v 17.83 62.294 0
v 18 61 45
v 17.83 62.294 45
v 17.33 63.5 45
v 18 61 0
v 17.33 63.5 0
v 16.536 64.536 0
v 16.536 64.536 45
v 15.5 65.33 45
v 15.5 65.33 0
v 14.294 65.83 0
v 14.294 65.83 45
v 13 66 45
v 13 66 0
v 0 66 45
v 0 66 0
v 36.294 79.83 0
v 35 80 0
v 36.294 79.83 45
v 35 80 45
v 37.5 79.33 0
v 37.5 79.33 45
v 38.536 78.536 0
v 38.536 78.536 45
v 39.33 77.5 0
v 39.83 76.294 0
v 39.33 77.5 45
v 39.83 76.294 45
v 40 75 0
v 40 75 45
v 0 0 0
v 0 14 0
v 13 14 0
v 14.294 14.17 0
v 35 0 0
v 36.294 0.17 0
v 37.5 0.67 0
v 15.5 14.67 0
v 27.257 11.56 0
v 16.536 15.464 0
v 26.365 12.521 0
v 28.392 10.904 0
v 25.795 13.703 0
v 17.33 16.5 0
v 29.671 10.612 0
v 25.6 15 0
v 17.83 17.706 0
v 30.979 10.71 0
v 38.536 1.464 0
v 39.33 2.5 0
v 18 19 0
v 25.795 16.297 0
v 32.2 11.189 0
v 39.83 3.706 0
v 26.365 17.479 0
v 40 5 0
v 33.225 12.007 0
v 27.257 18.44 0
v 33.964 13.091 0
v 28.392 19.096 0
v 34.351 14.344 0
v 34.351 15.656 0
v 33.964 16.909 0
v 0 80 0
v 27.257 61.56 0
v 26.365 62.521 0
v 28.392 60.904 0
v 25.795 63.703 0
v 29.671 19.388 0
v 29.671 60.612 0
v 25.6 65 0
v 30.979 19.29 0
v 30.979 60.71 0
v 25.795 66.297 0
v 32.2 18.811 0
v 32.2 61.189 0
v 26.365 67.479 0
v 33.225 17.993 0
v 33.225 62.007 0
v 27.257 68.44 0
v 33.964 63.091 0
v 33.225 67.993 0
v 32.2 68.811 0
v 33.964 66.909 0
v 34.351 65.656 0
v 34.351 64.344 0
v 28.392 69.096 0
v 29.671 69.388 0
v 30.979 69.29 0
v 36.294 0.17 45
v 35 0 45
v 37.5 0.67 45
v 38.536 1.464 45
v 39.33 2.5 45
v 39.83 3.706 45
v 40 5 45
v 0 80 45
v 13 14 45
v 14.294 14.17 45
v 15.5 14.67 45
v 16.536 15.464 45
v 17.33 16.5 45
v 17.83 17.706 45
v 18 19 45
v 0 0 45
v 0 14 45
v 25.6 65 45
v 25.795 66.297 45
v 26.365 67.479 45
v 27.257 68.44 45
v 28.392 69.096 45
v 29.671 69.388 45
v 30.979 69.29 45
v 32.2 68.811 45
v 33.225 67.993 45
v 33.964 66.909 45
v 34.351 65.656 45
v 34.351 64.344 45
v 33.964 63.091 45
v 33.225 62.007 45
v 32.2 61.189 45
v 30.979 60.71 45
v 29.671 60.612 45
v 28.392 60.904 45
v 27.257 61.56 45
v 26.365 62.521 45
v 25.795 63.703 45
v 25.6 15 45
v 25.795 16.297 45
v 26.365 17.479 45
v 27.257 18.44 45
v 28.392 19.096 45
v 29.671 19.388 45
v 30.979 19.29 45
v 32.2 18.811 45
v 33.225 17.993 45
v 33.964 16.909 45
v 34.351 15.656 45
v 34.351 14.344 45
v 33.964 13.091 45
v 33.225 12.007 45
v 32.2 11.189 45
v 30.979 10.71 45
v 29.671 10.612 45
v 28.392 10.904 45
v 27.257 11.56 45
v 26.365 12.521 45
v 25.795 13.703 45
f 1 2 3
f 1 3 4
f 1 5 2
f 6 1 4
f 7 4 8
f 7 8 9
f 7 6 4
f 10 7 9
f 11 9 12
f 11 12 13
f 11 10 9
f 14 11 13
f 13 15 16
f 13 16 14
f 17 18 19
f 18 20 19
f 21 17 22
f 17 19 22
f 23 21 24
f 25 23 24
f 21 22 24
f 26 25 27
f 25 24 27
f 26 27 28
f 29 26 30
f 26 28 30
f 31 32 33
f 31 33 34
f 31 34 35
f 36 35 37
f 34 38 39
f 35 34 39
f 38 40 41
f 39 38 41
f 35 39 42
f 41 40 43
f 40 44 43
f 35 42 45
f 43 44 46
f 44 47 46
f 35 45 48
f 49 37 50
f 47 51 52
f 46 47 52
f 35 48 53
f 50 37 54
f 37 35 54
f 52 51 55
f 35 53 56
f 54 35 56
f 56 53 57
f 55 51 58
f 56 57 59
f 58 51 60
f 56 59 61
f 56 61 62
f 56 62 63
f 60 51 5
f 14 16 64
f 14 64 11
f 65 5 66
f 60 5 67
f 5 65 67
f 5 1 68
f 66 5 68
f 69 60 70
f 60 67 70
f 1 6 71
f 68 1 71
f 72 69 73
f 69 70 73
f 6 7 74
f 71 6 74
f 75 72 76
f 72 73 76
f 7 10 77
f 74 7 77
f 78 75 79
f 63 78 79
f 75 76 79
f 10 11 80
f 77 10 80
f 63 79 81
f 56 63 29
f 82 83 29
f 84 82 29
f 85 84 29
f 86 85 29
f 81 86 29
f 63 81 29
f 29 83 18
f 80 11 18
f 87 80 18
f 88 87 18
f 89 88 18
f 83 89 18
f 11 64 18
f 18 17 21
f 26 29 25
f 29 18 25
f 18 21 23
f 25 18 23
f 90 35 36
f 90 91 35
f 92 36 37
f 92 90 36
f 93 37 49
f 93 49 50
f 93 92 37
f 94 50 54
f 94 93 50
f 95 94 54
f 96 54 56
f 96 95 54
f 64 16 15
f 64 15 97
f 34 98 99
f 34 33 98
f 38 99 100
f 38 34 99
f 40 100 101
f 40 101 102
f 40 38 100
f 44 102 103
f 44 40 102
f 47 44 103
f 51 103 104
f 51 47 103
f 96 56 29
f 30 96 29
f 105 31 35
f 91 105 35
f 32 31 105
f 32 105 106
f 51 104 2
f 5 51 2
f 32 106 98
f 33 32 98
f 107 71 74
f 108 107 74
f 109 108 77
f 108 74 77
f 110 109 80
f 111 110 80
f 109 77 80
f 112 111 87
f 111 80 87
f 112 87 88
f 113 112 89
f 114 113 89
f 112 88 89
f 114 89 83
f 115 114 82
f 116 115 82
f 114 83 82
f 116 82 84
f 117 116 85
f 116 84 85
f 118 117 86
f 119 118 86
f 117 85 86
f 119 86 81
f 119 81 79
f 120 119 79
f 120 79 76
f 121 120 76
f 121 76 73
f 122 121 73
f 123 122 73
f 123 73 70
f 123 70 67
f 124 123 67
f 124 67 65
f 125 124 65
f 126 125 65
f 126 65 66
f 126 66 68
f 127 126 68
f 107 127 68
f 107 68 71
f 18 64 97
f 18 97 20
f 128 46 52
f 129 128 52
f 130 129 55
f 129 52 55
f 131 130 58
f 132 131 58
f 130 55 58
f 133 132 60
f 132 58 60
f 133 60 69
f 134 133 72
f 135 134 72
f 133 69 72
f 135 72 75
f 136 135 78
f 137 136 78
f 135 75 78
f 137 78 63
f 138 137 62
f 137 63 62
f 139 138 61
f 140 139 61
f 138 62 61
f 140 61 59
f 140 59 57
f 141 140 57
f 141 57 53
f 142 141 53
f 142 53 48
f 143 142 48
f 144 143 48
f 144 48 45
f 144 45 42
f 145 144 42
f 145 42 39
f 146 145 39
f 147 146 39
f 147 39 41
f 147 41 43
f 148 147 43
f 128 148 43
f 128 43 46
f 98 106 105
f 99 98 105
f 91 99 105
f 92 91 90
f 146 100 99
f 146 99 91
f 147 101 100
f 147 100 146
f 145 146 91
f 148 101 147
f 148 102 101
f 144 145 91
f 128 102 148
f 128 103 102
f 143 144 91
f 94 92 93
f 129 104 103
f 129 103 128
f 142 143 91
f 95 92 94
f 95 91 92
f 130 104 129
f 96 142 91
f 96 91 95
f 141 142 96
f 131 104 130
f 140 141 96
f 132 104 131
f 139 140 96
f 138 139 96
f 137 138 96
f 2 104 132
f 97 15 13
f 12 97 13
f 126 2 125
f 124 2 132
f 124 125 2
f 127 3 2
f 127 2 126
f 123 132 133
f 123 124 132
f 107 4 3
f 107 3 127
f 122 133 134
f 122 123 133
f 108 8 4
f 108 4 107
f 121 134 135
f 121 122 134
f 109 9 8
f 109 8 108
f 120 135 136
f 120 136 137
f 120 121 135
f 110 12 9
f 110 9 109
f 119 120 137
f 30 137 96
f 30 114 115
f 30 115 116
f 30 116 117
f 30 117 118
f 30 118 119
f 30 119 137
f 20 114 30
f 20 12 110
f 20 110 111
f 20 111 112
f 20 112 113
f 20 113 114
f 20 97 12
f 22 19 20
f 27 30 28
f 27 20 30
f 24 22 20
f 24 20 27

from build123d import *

# Parameters (mm, degrees)
F0_W     = 40
F0_H     = 80
F1_DEPTH = 45
F3_D     = 8.8
F4_W     = 18
F4_H     = 52
F5_DEPTH = 45
F6_R     = 5


with BuildPart() as f1:
    # F0 (on Top) → F1 (new body)
    with BuildSketch(Plane.XY):
        with Locations((20, 40)):
            Rectangle(F0_W, F0_H)
    extrude(amount=F1_DEPTH)

    # F3 (through all)
    with Locations(Plane.XY.offset(45)):
        with Locations((30, 65), (30, 15)):
            Hole(F3_D / 2)

    # F4 (on face) → F5 (cut, through all)
    with BuildSketch(Plane.XY.offset(45)):
        with Locations((9, 40)):
            Rectangle(F4_W, F4_H)
    extrude(amount=-F5_DEPTH, mode=Mode.SUBTRACT)

    # F6
    f6_edges = [f1.edges().sort_by_distance(p)[0] for p in [
        (40, 0, 22.5),
        (40, 80, 22.5),
        (18, 14, 22.5),
        (18, 66, 22.5),
    ]]
    fillet(f6_edges, radius=F6_R)


solid = f1.part
